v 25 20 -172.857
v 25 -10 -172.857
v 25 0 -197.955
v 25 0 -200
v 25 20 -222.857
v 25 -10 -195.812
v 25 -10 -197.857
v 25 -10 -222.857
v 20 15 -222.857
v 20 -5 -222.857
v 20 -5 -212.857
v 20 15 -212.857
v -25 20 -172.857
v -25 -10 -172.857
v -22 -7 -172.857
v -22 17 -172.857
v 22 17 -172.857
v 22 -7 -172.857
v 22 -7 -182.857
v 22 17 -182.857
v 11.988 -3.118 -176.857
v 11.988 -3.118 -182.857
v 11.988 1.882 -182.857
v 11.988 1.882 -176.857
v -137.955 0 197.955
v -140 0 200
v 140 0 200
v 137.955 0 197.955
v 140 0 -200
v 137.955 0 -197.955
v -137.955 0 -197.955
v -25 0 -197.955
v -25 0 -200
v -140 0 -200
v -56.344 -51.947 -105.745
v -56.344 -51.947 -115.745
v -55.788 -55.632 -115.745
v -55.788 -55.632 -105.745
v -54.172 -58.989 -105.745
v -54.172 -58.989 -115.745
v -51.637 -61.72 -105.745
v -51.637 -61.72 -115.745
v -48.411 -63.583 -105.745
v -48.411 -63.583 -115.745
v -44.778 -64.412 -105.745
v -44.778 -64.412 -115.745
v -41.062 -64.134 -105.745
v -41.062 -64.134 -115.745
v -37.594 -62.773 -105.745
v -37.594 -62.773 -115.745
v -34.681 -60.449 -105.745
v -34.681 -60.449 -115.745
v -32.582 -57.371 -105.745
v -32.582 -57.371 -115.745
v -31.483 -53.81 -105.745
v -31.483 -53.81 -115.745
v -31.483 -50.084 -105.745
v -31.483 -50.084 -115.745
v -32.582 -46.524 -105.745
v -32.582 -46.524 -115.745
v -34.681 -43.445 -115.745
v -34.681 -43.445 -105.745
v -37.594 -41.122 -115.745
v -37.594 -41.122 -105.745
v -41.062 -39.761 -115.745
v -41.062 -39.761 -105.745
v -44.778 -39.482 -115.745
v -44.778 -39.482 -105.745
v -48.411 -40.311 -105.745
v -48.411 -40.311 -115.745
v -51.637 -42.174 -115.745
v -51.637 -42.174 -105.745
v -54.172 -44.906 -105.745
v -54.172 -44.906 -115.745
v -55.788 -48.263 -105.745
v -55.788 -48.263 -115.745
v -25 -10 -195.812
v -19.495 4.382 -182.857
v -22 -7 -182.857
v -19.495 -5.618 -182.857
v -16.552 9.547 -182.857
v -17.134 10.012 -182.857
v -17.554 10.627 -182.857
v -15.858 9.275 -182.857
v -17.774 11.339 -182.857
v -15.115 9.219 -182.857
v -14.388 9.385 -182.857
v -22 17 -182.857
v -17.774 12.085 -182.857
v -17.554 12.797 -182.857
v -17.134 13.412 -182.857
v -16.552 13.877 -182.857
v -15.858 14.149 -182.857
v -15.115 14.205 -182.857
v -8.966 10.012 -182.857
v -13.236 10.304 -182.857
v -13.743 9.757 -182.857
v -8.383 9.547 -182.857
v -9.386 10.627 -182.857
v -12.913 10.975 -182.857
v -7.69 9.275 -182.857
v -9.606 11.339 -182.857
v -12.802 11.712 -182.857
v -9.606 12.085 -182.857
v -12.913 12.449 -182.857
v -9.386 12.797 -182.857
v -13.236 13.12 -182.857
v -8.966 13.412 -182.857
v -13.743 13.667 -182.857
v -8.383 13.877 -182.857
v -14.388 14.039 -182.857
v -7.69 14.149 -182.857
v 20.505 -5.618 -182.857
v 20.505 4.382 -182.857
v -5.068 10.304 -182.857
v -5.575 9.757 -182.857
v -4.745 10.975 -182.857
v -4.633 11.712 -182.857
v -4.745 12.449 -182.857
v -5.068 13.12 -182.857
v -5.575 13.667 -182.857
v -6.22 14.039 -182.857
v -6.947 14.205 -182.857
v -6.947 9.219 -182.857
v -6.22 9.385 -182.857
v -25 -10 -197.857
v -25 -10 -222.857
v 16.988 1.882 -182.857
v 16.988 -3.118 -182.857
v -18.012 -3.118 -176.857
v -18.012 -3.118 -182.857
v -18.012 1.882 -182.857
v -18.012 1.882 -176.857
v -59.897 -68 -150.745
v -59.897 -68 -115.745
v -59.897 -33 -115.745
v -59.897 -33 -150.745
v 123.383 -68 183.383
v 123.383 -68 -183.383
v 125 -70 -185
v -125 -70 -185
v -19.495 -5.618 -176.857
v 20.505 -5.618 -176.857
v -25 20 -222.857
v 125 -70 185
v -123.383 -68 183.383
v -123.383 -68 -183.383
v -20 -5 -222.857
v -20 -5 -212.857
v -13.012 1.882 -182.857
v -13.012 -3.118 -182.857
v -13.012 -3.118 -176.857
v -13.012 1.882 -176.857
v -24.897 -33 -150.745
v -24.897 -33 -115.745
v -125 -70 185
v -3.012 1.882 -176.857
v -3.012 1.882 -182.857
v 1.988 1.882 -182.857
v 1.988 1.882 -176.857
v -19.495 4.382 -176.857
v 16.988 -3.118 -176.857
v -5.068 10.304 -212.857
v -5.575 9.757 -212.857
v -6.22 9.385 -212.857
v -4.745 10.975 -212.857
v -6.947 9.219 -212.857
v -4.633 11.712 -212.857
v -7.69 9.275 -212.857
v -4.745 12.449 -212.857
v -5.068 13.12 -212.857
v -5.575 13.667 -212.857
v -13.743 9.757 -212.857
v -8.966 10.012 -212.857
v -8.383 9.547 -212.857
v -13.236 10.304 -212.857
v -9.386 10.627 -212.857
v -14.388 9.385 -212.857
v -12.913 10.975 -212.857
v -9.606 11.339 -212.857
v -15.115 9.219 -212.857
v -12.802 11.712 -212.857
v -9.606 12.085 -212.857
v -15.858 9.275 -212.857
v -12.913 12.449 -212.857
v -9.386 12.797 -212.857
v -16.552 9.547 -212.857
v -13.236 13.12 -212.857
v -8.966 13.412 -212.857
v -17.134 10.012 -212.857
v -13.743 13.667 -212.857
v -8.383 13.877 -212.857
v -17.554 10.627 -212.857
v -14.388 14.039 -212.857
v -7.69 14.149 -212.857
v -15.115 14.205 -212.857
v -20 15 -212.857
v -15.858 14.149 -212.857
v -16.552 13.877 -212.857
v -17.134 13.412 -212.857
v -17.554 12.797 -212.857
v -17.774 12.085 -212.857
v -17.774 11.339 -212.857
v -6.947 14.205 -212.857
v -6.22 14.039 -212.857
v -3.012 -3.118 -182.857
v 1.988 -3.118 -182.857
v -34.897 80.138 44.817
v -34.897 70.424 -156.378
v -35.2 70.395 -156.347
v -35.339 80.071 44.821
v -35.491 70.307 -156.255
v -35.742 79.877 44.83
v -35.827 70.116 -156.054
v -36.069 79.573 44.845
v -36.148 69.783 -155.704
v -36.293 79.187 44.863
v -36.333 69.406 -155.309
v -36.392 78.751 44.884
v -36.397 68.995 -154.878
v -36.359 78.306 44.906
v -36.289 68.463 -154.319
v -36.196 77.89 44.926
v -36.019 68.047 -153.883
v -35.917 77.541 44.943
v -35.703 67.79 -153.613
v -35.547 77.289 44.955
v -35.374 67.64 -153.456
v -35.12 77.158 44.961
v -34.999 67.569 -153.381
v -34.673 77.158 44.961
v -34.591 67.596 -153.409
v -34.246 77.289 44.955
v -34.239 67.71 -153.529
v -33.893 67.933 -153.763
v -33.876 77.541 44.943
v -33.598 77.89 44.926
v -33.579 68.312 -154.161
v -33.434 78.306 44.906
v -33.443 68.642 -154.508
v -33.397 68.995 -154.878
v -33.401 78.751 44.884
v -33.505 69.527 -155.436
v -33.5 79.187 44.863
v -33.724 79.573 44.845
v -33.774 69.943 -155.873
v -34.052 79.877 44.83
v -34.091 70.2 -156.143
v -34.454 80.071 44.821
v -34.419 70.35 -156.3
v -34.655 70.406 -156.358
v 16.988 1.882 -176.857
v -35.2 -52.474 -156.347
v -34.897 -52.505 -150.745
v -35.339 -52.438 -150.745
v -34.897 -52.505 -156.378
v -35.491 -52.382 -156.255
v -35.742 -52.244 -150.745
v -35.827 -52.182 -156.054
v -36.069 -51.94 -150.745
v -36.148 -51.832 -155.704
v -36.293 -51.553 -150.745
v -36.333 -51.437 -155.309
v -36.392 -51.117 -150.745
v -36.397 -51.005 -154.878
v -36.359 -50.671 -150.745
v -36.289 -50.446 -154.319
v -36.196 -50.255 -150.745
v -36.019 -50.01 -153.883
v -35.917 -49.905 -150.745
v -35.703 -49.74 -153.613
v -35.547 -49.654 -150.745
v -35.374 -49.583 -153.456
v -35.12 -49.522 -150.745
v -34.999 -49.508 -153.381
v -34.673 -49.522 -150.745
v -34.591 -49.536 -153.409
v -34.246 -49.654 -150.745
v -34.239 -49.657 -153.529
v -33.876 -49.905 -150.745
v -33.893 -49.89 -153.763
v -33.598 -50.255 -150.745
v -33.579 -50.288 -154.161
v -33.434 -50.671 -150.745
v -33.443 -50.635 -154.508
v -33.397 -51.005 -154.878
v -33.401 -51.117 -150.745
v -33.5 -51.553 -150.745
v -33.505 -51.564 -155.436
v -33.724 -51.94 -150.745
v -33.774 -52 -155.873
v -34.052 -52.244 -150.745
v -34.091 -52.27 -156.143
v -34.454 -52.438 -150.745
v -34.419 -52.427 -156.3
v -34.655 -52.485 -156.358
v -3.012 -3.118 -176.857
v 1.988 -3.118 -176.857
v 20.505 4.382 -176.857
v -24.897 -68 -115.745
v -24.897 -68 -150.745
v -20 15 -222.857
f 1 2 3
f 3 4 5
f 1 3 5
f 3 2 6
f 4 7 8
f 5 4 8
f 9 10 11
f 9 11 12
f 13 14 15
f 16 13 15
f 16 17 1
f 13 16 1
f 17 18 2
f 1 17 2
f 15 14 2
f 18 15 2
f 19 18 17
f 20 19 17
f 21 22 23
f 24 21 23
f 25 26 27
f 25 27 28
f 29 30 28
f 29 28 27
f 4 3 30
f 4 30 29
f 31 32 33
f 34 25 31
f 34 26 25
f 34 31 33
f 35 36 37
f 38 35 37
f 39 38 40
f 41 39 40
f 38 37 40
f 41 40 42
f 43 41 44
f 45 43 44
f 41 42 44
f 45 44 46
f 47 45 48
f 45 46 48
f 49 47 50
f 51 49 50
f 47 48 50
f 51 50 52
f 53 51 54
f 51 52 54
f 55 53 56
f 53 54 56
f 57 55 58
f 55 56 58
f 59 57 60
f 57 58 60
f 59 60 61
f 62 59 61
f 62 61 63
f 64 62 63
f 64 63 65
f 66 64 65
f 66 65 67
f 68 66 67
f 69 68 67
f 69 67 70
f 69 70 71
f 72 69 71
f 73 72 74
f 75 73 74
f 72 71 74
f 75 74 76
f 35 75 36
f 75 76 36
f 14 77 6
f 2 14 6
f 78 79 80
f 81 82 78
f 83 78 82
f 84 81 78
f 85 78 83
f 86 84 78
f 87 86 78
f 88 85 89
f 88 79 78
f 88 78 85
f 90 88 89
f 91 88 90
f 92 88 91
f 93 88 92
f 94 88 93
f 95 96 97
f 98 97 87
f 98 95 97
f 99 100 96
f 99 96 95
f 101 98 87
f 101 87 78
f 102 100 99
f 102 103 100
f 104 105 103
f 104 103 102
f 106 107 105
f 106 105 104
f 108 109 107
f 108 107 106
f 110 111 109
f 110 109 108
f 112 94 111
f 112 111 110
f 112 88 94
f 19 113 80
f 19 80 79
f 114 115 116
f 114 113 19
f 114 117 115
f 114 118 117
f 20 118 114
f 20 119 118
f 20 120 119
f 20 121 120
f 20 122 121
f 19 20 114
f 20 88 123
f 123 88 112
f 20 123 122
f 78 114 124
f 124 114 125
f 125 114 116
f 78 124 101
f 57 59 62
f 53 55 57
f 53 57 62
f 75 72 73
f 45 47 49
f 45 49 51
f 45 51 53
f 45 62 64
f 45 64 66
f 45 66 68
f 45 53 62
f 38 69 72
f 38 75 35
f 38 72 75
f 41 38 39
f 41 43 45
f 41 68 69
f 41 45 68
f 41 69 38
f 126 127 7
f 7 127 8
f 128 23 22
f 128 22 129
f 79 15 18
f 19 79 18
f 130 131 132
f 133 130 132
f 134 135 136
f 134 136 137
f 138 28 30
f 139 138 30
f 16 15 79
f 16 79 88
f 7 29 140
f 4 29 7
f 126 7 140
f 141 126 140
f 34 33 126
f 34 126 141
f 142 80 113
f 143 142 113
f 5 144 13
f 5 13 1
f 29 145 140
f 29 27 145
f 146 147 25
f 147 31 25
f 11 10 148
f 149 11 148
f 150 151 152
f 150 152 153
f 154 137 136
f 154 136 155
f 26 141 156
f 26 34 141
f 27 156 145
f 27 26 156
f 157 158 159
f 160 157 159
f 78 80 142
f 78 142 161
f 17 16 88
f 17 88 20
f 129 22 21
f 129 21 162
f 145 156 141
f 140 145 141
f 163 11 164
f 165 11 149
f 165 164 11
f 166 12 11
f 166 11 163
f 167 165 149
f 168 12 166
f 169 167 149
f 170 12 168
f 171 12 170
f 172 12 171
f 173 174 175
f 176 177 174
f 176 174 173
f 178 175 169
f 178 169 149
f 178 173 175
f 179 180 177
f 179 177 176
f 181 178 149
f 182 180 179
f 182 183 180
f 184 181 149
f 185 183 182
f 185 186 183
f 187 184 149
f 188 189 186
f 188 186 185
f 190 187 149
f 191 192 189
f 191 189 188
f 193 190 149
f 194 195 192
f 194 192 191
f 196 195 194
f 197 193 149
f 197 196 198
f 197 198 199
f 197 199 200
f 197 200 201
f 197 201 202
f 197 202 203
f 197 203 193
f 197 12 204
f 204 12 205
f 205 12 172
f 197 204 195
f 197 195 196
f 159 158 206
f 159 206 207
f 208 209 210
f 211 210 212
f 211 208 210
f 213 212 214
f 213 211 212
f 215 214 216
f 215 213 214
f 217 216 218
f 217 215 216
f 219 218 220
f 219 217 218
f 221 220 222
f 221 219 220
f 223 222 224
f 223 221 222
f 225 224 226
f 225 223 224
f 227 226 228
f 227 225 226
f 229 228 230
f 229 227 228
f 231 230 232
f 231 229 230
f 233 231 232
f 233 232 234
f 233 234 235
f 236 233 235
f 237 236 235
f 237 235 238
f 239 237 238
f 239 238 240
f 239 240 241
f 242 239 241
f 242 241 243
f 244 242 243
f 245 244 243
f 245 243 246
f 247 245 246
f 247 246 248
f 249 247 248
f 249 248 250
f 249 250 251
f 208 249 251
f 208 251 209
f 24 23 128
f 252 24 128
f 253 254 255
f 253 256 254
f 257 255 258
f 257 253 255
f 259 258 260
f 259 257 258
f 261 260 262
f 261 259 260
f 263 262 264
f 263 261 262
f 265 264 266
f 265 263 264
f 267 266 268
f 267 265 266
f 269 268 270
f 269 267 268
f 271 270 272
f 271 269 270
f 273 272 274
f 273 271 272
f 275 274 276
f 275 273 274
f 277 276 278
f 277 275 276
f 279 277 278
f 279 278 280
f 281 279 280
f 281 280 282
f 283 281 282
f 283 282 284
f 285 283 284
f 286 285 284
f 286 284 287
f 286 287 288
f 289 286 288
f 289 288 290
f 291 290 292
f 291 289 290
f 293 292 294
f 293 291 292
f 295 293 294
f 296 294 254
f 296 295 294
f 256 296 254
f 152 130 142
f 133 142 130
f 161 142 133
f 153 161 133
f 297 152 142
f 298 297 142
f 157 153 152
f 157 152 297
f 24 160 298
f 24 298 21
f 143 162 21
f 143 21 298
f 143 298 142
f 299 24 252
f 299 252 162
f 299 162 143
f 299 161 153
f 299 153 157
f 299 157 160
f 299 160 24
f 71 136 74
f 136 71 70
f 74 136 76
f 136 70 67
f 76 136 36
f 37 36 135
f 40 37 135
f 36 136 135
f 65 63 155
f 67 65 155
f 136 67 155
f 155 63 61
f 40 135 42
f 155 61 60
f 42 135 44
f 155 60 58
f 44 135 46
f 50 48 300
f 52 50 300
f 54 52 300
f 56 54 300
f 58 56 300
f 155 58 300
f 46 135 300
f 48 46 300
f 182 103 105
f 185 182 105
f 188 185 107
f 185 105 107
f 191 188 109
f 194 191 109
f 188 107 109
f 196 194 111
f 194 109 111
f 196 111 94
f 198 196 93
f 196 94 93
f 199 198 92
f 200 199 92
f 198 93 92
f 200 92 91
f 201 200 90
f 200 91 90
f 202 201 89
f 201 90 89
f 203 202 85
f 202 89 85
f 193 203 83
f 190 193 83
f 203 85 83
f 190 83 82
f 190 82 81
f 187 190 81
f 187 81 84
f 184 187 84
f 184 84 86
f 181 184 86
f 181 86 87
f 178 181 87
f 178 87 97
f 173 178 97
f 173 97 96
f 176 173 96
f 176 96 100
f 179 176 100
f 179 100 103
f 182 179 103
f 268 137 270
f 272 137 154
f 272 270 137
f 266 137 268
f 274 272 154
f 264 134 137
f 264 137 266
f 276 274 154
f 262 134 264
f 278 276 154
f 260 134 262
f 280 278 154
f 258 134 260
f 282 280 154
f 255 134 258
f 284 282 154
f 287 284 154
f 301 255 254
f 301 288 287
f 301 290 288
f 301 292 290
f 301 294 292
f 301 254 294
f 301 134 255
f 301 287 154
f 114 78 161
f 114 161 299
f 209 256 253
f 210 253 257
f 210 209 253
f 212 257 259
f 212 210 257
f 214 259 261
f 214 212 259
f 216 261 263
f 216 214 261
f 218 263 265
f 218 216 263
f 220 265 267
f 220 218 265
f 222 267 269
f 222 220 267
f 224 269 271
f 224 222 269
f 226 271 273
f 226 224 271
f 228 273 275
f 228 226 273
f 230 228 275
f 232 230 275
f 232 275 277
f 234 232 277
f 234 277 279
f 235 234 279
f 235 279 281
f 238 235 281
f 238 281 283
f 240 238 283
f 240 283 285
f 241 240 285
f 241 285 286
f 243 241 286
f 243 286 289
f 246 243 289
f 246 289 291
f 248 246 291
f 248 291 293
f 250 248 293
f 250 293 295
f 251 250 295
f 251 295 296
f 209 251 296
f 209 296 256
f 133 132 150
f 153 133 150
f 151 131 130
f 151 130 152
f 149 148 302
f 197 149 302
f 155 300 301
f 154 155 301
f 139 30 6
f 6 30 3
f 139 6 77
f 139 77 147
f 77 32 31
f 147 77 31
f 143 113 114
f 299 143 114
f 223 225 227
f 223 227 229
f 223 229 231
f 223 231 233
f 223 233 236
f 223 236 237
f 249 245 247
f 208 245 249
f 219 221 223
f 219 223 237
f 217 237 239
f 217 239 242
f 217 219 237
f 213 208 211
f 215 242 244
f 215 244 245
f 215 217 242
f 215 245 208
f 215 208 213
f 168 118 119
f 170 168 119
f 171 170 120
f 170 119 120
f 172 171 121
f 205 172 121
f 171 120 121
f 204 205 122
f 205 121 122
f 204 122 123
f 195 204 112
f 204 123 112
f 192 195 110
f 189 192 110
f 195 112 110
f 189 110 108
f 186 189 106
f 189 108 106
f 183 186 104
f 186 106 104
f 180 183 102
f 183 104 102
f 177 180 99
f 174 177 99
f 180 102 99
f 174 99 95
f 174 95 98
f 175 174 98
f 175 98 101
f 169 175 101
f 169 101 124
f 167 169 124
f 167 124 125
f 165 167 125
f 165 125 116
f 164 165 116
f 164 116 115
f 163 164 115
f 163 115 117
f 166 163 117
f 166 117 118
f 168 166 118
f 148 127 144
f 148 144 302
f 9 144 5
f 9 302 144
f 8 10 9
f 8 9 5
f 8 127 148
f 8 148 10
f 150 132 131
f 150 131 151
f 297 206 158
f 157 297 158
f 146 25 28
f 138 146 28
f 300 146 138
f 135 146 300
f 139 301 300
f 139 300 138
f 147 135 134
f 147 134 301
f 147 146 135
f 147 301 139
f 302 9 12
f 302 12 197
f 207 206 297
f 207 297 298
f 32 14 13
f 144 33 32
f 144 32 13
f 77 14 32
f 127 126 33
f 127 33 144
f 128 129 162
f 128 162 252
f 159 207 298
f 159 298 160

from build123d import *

# Parameters (mm, degrees)
SKETCH2_W           = 250
SKETCH2_H           = 370
SKETCH1_W           = 280
SKETCH1_H           = 400
SHELL1_T            = -2
SKETCH3_W           = 50
SKETCH3_H           = 50
CUT_EXTRUDE1_DEPTH  = 10
SKETCH4_W           = 50
SKETCH4_H           = 50
BOSS_EXTRUDE2_DEPTH = 30
SKETCH6_W           = 44
SKETCH6_H           = 24
CUT_EXTRUDE2_DEPTH  = 10
SKETCH7_W           = 40
SKETCH7_H           = 20
CUT_EXTRUDE3_DEPTH  = 10
SKETCH8_R           = 2.5
CUT_EXTRUDE4_DEPTH  = 60
SKETCH9_W           = 40
SKETCH9_H           = 10
SKETCH9_W_2         = 5
SKETCH9_H_2         = 5
BOSS_EXTRUDE3_DEPTH = 6
SKETCH10_W          = 35
SKETCH10_H          = 35
BOSS_EXTRUDE5_DEPTH = 35
SKETCH11_R          = 12.5
BOSS_EXTRUDE6_DEPTH = 10
SWEEP1_PROFILE_R    = 1.5


with BuildPart() as part:
    # Sketch2 → Loft1 section 0
    with BuildSketch(Plane(origin=(0, -70, 0), x_dir=(1, 0, 0), z_dir=(0, 1, 0))):
        Rectangle(SKETCH2_W, SKETCH2_H)
    # Sketch1 → Loft1 section 1
    with BuildSketch(Plane(origin=(0, 0, 0), x_dir=(1, 0, 0), z_dir=(0, 1, 0))):
        Rectangle(SKETCH1_W, SKETCH1_H)
    loft()

    # Shell1
    shell1_openings = [part.faces().sort_by_distance(p)[0] for p in [
        (0, 0, 0),
    ]]
    offset(amount=SHELL1_T, openings=shell1_openings, kind=Kind.INTERSECTION)

    # Sketch3 → Cut-Extrude1 (cut)
    with BuildSketch(Plane(origin=(0, 0, 0), x_dir=(1, 0, 0), z_dir=(0, 1, 0))):
        with Locations((0, 200)):
            Rectangle(SKETCH3_W, SKETCH3_H)
    extrude(amount=-CUT_EXTRUDE1_DEPTH, mode=Mode.SUBTRACT)



with BuildPart() as body_2:
    # Sketch4 → Boss-Extrude2 (new body)
    with BuildSketch(Plane(origin=(0, -10, 0), x_dir=(1, 0, 0), z_dir=(0, 1, 0))):
        with Locations((0, 197.857142857)):
            Rectangle(SKETCH4_W, SKETCH4_H)
    extrude(amount=BOSS_EXTRUDE2_DEPTH)

    # Sketch6 → Cut-Extrude2 (cut)
    with BuildSketch(Plane.XY.offset(-172.857142857)):
        with Locations((0, 5)):
            Rectangle(SKETCH6_W, SKETCH6_H)
    extrude(amount=-CUT_EXTRUDE2_DEPTH, mode=Mode.SUBTRACT)

    # Sketch7 → Cut-Extrude3 (cut)
    with BuildSketch(Plane(origin=(0, 0, -222.857142857), x_dir=(-1, 0, 0), z_dir=(0, 0, -1))):
        with Locations((0, 5)):
            Rectangle(SKETCH7_W, SKETCH7_H)
    extrude(amount=-CUT_EXTRUDE3_DEPTH, mode=Mode.SUBTRACT)

    # Sketch8 → Cut-Extrude4 (cut)
    with BuildSketch(Plane.XY.offset(-182.857142857)):
        with Locations((-15.301608644, 11.712017977)):
            Circle(SKETCH8_R)
        with Locations((-7.133483514, 11.712017977)):
            Circle(SKETCH8_R)
    extrude(amount=-CUT_EXTRUDE4_DEPTH, mode=Mode.SUBTRACT)


with BuildPart() as part_1:
    add(part.part)

    add(body_2.part)  # Boss-Extrude3 merges body 2
    # Sketch9 → Boss-Extrude3 (add)
    with BuildSketch(Plane.XY.offset(-182.857142857)):
        with Locations((0.504671377, -0.618402812)):
            Rectangle(SKETCH9_W, SKETCH9_H)
        with Locations((-15.511503932, -0.618402812)):
            Rectangle(SKETCH9_W_2, SKETCH9_H_2, mode=Mode.SUBTRACT)
        with Locations((-0.511503932, -0.618402812)):
            Rectangle(SKETCH9_W_2, SKETCH9_H_2, mode=Mode.SUBTRACT)
        with Locations((14.488496068, -0.618402812)):
            Rectangle(SKETCH9_W_2, SKETCH9_H_2, mode=Mode.SUBTRACT)
    extrude(amount=BOSS_EXTRUDE3_DEPTH)



with BuildPart() as body_2_2:
    # Sketch10 → Boss-Extrude5 (new body)
    with BuildSketch(Plane(origin=(0, -68, 0), x_dir=(1, 0, 0), z_dir=(0, 1, 0))):
        with Locations((-42.39654967, 133.244997545)):
            Rectangle(SKETCH10_W, SKETCH10_H)
    extrude(amount=BOSS_EXTRUDE5_DEPTH)


with BuildPart() as part_2:
    add(part_1.part)

    add(body_2_2.part)  # Boss-Extrude6 merges body 2 2
    # Sketch11 → Boss-Extrude6 (add)
    with BuildSketch(Plane.XY.offset(-115.744997545)):
        with Locations(Location((-43.843818636, -51.947268965, 0), (0, 0, 180))):  # turned: the seam where the file's is
            Circle(SKETCH11_R)
    extrude(amount=BOSS_EXTRUDE6_DEPTH)

    # Sweep1: sweep along a path in Sketch12
    with BuildLine(Plane.ZY.offset(34.89654967)) as sweep1_path:
        Line((-149.877541463, -51.005012101), (-154.877541463, -51.005012101))
        Line((-154.877541463, -51.005012101), (-154.877541463, 68.994987899))
        Line((-154.877541463, 68.994987899), (44.889790726, 78.639312125))
    # Sweep1 profile (on start of the path) → Sweep1 (sweep)
    with BuildSketch(Plane(origin=(-34.89654967, -51.005012101, -149.877541463), x_dir=(0, -1, 0), z_dir=(0, 0, -1))):
        Circle(SWEEP1_PROFILE_R)
    sweep(path=sweep1_path.line, transition=Transition.RIGHT)


solid = part_2.part
